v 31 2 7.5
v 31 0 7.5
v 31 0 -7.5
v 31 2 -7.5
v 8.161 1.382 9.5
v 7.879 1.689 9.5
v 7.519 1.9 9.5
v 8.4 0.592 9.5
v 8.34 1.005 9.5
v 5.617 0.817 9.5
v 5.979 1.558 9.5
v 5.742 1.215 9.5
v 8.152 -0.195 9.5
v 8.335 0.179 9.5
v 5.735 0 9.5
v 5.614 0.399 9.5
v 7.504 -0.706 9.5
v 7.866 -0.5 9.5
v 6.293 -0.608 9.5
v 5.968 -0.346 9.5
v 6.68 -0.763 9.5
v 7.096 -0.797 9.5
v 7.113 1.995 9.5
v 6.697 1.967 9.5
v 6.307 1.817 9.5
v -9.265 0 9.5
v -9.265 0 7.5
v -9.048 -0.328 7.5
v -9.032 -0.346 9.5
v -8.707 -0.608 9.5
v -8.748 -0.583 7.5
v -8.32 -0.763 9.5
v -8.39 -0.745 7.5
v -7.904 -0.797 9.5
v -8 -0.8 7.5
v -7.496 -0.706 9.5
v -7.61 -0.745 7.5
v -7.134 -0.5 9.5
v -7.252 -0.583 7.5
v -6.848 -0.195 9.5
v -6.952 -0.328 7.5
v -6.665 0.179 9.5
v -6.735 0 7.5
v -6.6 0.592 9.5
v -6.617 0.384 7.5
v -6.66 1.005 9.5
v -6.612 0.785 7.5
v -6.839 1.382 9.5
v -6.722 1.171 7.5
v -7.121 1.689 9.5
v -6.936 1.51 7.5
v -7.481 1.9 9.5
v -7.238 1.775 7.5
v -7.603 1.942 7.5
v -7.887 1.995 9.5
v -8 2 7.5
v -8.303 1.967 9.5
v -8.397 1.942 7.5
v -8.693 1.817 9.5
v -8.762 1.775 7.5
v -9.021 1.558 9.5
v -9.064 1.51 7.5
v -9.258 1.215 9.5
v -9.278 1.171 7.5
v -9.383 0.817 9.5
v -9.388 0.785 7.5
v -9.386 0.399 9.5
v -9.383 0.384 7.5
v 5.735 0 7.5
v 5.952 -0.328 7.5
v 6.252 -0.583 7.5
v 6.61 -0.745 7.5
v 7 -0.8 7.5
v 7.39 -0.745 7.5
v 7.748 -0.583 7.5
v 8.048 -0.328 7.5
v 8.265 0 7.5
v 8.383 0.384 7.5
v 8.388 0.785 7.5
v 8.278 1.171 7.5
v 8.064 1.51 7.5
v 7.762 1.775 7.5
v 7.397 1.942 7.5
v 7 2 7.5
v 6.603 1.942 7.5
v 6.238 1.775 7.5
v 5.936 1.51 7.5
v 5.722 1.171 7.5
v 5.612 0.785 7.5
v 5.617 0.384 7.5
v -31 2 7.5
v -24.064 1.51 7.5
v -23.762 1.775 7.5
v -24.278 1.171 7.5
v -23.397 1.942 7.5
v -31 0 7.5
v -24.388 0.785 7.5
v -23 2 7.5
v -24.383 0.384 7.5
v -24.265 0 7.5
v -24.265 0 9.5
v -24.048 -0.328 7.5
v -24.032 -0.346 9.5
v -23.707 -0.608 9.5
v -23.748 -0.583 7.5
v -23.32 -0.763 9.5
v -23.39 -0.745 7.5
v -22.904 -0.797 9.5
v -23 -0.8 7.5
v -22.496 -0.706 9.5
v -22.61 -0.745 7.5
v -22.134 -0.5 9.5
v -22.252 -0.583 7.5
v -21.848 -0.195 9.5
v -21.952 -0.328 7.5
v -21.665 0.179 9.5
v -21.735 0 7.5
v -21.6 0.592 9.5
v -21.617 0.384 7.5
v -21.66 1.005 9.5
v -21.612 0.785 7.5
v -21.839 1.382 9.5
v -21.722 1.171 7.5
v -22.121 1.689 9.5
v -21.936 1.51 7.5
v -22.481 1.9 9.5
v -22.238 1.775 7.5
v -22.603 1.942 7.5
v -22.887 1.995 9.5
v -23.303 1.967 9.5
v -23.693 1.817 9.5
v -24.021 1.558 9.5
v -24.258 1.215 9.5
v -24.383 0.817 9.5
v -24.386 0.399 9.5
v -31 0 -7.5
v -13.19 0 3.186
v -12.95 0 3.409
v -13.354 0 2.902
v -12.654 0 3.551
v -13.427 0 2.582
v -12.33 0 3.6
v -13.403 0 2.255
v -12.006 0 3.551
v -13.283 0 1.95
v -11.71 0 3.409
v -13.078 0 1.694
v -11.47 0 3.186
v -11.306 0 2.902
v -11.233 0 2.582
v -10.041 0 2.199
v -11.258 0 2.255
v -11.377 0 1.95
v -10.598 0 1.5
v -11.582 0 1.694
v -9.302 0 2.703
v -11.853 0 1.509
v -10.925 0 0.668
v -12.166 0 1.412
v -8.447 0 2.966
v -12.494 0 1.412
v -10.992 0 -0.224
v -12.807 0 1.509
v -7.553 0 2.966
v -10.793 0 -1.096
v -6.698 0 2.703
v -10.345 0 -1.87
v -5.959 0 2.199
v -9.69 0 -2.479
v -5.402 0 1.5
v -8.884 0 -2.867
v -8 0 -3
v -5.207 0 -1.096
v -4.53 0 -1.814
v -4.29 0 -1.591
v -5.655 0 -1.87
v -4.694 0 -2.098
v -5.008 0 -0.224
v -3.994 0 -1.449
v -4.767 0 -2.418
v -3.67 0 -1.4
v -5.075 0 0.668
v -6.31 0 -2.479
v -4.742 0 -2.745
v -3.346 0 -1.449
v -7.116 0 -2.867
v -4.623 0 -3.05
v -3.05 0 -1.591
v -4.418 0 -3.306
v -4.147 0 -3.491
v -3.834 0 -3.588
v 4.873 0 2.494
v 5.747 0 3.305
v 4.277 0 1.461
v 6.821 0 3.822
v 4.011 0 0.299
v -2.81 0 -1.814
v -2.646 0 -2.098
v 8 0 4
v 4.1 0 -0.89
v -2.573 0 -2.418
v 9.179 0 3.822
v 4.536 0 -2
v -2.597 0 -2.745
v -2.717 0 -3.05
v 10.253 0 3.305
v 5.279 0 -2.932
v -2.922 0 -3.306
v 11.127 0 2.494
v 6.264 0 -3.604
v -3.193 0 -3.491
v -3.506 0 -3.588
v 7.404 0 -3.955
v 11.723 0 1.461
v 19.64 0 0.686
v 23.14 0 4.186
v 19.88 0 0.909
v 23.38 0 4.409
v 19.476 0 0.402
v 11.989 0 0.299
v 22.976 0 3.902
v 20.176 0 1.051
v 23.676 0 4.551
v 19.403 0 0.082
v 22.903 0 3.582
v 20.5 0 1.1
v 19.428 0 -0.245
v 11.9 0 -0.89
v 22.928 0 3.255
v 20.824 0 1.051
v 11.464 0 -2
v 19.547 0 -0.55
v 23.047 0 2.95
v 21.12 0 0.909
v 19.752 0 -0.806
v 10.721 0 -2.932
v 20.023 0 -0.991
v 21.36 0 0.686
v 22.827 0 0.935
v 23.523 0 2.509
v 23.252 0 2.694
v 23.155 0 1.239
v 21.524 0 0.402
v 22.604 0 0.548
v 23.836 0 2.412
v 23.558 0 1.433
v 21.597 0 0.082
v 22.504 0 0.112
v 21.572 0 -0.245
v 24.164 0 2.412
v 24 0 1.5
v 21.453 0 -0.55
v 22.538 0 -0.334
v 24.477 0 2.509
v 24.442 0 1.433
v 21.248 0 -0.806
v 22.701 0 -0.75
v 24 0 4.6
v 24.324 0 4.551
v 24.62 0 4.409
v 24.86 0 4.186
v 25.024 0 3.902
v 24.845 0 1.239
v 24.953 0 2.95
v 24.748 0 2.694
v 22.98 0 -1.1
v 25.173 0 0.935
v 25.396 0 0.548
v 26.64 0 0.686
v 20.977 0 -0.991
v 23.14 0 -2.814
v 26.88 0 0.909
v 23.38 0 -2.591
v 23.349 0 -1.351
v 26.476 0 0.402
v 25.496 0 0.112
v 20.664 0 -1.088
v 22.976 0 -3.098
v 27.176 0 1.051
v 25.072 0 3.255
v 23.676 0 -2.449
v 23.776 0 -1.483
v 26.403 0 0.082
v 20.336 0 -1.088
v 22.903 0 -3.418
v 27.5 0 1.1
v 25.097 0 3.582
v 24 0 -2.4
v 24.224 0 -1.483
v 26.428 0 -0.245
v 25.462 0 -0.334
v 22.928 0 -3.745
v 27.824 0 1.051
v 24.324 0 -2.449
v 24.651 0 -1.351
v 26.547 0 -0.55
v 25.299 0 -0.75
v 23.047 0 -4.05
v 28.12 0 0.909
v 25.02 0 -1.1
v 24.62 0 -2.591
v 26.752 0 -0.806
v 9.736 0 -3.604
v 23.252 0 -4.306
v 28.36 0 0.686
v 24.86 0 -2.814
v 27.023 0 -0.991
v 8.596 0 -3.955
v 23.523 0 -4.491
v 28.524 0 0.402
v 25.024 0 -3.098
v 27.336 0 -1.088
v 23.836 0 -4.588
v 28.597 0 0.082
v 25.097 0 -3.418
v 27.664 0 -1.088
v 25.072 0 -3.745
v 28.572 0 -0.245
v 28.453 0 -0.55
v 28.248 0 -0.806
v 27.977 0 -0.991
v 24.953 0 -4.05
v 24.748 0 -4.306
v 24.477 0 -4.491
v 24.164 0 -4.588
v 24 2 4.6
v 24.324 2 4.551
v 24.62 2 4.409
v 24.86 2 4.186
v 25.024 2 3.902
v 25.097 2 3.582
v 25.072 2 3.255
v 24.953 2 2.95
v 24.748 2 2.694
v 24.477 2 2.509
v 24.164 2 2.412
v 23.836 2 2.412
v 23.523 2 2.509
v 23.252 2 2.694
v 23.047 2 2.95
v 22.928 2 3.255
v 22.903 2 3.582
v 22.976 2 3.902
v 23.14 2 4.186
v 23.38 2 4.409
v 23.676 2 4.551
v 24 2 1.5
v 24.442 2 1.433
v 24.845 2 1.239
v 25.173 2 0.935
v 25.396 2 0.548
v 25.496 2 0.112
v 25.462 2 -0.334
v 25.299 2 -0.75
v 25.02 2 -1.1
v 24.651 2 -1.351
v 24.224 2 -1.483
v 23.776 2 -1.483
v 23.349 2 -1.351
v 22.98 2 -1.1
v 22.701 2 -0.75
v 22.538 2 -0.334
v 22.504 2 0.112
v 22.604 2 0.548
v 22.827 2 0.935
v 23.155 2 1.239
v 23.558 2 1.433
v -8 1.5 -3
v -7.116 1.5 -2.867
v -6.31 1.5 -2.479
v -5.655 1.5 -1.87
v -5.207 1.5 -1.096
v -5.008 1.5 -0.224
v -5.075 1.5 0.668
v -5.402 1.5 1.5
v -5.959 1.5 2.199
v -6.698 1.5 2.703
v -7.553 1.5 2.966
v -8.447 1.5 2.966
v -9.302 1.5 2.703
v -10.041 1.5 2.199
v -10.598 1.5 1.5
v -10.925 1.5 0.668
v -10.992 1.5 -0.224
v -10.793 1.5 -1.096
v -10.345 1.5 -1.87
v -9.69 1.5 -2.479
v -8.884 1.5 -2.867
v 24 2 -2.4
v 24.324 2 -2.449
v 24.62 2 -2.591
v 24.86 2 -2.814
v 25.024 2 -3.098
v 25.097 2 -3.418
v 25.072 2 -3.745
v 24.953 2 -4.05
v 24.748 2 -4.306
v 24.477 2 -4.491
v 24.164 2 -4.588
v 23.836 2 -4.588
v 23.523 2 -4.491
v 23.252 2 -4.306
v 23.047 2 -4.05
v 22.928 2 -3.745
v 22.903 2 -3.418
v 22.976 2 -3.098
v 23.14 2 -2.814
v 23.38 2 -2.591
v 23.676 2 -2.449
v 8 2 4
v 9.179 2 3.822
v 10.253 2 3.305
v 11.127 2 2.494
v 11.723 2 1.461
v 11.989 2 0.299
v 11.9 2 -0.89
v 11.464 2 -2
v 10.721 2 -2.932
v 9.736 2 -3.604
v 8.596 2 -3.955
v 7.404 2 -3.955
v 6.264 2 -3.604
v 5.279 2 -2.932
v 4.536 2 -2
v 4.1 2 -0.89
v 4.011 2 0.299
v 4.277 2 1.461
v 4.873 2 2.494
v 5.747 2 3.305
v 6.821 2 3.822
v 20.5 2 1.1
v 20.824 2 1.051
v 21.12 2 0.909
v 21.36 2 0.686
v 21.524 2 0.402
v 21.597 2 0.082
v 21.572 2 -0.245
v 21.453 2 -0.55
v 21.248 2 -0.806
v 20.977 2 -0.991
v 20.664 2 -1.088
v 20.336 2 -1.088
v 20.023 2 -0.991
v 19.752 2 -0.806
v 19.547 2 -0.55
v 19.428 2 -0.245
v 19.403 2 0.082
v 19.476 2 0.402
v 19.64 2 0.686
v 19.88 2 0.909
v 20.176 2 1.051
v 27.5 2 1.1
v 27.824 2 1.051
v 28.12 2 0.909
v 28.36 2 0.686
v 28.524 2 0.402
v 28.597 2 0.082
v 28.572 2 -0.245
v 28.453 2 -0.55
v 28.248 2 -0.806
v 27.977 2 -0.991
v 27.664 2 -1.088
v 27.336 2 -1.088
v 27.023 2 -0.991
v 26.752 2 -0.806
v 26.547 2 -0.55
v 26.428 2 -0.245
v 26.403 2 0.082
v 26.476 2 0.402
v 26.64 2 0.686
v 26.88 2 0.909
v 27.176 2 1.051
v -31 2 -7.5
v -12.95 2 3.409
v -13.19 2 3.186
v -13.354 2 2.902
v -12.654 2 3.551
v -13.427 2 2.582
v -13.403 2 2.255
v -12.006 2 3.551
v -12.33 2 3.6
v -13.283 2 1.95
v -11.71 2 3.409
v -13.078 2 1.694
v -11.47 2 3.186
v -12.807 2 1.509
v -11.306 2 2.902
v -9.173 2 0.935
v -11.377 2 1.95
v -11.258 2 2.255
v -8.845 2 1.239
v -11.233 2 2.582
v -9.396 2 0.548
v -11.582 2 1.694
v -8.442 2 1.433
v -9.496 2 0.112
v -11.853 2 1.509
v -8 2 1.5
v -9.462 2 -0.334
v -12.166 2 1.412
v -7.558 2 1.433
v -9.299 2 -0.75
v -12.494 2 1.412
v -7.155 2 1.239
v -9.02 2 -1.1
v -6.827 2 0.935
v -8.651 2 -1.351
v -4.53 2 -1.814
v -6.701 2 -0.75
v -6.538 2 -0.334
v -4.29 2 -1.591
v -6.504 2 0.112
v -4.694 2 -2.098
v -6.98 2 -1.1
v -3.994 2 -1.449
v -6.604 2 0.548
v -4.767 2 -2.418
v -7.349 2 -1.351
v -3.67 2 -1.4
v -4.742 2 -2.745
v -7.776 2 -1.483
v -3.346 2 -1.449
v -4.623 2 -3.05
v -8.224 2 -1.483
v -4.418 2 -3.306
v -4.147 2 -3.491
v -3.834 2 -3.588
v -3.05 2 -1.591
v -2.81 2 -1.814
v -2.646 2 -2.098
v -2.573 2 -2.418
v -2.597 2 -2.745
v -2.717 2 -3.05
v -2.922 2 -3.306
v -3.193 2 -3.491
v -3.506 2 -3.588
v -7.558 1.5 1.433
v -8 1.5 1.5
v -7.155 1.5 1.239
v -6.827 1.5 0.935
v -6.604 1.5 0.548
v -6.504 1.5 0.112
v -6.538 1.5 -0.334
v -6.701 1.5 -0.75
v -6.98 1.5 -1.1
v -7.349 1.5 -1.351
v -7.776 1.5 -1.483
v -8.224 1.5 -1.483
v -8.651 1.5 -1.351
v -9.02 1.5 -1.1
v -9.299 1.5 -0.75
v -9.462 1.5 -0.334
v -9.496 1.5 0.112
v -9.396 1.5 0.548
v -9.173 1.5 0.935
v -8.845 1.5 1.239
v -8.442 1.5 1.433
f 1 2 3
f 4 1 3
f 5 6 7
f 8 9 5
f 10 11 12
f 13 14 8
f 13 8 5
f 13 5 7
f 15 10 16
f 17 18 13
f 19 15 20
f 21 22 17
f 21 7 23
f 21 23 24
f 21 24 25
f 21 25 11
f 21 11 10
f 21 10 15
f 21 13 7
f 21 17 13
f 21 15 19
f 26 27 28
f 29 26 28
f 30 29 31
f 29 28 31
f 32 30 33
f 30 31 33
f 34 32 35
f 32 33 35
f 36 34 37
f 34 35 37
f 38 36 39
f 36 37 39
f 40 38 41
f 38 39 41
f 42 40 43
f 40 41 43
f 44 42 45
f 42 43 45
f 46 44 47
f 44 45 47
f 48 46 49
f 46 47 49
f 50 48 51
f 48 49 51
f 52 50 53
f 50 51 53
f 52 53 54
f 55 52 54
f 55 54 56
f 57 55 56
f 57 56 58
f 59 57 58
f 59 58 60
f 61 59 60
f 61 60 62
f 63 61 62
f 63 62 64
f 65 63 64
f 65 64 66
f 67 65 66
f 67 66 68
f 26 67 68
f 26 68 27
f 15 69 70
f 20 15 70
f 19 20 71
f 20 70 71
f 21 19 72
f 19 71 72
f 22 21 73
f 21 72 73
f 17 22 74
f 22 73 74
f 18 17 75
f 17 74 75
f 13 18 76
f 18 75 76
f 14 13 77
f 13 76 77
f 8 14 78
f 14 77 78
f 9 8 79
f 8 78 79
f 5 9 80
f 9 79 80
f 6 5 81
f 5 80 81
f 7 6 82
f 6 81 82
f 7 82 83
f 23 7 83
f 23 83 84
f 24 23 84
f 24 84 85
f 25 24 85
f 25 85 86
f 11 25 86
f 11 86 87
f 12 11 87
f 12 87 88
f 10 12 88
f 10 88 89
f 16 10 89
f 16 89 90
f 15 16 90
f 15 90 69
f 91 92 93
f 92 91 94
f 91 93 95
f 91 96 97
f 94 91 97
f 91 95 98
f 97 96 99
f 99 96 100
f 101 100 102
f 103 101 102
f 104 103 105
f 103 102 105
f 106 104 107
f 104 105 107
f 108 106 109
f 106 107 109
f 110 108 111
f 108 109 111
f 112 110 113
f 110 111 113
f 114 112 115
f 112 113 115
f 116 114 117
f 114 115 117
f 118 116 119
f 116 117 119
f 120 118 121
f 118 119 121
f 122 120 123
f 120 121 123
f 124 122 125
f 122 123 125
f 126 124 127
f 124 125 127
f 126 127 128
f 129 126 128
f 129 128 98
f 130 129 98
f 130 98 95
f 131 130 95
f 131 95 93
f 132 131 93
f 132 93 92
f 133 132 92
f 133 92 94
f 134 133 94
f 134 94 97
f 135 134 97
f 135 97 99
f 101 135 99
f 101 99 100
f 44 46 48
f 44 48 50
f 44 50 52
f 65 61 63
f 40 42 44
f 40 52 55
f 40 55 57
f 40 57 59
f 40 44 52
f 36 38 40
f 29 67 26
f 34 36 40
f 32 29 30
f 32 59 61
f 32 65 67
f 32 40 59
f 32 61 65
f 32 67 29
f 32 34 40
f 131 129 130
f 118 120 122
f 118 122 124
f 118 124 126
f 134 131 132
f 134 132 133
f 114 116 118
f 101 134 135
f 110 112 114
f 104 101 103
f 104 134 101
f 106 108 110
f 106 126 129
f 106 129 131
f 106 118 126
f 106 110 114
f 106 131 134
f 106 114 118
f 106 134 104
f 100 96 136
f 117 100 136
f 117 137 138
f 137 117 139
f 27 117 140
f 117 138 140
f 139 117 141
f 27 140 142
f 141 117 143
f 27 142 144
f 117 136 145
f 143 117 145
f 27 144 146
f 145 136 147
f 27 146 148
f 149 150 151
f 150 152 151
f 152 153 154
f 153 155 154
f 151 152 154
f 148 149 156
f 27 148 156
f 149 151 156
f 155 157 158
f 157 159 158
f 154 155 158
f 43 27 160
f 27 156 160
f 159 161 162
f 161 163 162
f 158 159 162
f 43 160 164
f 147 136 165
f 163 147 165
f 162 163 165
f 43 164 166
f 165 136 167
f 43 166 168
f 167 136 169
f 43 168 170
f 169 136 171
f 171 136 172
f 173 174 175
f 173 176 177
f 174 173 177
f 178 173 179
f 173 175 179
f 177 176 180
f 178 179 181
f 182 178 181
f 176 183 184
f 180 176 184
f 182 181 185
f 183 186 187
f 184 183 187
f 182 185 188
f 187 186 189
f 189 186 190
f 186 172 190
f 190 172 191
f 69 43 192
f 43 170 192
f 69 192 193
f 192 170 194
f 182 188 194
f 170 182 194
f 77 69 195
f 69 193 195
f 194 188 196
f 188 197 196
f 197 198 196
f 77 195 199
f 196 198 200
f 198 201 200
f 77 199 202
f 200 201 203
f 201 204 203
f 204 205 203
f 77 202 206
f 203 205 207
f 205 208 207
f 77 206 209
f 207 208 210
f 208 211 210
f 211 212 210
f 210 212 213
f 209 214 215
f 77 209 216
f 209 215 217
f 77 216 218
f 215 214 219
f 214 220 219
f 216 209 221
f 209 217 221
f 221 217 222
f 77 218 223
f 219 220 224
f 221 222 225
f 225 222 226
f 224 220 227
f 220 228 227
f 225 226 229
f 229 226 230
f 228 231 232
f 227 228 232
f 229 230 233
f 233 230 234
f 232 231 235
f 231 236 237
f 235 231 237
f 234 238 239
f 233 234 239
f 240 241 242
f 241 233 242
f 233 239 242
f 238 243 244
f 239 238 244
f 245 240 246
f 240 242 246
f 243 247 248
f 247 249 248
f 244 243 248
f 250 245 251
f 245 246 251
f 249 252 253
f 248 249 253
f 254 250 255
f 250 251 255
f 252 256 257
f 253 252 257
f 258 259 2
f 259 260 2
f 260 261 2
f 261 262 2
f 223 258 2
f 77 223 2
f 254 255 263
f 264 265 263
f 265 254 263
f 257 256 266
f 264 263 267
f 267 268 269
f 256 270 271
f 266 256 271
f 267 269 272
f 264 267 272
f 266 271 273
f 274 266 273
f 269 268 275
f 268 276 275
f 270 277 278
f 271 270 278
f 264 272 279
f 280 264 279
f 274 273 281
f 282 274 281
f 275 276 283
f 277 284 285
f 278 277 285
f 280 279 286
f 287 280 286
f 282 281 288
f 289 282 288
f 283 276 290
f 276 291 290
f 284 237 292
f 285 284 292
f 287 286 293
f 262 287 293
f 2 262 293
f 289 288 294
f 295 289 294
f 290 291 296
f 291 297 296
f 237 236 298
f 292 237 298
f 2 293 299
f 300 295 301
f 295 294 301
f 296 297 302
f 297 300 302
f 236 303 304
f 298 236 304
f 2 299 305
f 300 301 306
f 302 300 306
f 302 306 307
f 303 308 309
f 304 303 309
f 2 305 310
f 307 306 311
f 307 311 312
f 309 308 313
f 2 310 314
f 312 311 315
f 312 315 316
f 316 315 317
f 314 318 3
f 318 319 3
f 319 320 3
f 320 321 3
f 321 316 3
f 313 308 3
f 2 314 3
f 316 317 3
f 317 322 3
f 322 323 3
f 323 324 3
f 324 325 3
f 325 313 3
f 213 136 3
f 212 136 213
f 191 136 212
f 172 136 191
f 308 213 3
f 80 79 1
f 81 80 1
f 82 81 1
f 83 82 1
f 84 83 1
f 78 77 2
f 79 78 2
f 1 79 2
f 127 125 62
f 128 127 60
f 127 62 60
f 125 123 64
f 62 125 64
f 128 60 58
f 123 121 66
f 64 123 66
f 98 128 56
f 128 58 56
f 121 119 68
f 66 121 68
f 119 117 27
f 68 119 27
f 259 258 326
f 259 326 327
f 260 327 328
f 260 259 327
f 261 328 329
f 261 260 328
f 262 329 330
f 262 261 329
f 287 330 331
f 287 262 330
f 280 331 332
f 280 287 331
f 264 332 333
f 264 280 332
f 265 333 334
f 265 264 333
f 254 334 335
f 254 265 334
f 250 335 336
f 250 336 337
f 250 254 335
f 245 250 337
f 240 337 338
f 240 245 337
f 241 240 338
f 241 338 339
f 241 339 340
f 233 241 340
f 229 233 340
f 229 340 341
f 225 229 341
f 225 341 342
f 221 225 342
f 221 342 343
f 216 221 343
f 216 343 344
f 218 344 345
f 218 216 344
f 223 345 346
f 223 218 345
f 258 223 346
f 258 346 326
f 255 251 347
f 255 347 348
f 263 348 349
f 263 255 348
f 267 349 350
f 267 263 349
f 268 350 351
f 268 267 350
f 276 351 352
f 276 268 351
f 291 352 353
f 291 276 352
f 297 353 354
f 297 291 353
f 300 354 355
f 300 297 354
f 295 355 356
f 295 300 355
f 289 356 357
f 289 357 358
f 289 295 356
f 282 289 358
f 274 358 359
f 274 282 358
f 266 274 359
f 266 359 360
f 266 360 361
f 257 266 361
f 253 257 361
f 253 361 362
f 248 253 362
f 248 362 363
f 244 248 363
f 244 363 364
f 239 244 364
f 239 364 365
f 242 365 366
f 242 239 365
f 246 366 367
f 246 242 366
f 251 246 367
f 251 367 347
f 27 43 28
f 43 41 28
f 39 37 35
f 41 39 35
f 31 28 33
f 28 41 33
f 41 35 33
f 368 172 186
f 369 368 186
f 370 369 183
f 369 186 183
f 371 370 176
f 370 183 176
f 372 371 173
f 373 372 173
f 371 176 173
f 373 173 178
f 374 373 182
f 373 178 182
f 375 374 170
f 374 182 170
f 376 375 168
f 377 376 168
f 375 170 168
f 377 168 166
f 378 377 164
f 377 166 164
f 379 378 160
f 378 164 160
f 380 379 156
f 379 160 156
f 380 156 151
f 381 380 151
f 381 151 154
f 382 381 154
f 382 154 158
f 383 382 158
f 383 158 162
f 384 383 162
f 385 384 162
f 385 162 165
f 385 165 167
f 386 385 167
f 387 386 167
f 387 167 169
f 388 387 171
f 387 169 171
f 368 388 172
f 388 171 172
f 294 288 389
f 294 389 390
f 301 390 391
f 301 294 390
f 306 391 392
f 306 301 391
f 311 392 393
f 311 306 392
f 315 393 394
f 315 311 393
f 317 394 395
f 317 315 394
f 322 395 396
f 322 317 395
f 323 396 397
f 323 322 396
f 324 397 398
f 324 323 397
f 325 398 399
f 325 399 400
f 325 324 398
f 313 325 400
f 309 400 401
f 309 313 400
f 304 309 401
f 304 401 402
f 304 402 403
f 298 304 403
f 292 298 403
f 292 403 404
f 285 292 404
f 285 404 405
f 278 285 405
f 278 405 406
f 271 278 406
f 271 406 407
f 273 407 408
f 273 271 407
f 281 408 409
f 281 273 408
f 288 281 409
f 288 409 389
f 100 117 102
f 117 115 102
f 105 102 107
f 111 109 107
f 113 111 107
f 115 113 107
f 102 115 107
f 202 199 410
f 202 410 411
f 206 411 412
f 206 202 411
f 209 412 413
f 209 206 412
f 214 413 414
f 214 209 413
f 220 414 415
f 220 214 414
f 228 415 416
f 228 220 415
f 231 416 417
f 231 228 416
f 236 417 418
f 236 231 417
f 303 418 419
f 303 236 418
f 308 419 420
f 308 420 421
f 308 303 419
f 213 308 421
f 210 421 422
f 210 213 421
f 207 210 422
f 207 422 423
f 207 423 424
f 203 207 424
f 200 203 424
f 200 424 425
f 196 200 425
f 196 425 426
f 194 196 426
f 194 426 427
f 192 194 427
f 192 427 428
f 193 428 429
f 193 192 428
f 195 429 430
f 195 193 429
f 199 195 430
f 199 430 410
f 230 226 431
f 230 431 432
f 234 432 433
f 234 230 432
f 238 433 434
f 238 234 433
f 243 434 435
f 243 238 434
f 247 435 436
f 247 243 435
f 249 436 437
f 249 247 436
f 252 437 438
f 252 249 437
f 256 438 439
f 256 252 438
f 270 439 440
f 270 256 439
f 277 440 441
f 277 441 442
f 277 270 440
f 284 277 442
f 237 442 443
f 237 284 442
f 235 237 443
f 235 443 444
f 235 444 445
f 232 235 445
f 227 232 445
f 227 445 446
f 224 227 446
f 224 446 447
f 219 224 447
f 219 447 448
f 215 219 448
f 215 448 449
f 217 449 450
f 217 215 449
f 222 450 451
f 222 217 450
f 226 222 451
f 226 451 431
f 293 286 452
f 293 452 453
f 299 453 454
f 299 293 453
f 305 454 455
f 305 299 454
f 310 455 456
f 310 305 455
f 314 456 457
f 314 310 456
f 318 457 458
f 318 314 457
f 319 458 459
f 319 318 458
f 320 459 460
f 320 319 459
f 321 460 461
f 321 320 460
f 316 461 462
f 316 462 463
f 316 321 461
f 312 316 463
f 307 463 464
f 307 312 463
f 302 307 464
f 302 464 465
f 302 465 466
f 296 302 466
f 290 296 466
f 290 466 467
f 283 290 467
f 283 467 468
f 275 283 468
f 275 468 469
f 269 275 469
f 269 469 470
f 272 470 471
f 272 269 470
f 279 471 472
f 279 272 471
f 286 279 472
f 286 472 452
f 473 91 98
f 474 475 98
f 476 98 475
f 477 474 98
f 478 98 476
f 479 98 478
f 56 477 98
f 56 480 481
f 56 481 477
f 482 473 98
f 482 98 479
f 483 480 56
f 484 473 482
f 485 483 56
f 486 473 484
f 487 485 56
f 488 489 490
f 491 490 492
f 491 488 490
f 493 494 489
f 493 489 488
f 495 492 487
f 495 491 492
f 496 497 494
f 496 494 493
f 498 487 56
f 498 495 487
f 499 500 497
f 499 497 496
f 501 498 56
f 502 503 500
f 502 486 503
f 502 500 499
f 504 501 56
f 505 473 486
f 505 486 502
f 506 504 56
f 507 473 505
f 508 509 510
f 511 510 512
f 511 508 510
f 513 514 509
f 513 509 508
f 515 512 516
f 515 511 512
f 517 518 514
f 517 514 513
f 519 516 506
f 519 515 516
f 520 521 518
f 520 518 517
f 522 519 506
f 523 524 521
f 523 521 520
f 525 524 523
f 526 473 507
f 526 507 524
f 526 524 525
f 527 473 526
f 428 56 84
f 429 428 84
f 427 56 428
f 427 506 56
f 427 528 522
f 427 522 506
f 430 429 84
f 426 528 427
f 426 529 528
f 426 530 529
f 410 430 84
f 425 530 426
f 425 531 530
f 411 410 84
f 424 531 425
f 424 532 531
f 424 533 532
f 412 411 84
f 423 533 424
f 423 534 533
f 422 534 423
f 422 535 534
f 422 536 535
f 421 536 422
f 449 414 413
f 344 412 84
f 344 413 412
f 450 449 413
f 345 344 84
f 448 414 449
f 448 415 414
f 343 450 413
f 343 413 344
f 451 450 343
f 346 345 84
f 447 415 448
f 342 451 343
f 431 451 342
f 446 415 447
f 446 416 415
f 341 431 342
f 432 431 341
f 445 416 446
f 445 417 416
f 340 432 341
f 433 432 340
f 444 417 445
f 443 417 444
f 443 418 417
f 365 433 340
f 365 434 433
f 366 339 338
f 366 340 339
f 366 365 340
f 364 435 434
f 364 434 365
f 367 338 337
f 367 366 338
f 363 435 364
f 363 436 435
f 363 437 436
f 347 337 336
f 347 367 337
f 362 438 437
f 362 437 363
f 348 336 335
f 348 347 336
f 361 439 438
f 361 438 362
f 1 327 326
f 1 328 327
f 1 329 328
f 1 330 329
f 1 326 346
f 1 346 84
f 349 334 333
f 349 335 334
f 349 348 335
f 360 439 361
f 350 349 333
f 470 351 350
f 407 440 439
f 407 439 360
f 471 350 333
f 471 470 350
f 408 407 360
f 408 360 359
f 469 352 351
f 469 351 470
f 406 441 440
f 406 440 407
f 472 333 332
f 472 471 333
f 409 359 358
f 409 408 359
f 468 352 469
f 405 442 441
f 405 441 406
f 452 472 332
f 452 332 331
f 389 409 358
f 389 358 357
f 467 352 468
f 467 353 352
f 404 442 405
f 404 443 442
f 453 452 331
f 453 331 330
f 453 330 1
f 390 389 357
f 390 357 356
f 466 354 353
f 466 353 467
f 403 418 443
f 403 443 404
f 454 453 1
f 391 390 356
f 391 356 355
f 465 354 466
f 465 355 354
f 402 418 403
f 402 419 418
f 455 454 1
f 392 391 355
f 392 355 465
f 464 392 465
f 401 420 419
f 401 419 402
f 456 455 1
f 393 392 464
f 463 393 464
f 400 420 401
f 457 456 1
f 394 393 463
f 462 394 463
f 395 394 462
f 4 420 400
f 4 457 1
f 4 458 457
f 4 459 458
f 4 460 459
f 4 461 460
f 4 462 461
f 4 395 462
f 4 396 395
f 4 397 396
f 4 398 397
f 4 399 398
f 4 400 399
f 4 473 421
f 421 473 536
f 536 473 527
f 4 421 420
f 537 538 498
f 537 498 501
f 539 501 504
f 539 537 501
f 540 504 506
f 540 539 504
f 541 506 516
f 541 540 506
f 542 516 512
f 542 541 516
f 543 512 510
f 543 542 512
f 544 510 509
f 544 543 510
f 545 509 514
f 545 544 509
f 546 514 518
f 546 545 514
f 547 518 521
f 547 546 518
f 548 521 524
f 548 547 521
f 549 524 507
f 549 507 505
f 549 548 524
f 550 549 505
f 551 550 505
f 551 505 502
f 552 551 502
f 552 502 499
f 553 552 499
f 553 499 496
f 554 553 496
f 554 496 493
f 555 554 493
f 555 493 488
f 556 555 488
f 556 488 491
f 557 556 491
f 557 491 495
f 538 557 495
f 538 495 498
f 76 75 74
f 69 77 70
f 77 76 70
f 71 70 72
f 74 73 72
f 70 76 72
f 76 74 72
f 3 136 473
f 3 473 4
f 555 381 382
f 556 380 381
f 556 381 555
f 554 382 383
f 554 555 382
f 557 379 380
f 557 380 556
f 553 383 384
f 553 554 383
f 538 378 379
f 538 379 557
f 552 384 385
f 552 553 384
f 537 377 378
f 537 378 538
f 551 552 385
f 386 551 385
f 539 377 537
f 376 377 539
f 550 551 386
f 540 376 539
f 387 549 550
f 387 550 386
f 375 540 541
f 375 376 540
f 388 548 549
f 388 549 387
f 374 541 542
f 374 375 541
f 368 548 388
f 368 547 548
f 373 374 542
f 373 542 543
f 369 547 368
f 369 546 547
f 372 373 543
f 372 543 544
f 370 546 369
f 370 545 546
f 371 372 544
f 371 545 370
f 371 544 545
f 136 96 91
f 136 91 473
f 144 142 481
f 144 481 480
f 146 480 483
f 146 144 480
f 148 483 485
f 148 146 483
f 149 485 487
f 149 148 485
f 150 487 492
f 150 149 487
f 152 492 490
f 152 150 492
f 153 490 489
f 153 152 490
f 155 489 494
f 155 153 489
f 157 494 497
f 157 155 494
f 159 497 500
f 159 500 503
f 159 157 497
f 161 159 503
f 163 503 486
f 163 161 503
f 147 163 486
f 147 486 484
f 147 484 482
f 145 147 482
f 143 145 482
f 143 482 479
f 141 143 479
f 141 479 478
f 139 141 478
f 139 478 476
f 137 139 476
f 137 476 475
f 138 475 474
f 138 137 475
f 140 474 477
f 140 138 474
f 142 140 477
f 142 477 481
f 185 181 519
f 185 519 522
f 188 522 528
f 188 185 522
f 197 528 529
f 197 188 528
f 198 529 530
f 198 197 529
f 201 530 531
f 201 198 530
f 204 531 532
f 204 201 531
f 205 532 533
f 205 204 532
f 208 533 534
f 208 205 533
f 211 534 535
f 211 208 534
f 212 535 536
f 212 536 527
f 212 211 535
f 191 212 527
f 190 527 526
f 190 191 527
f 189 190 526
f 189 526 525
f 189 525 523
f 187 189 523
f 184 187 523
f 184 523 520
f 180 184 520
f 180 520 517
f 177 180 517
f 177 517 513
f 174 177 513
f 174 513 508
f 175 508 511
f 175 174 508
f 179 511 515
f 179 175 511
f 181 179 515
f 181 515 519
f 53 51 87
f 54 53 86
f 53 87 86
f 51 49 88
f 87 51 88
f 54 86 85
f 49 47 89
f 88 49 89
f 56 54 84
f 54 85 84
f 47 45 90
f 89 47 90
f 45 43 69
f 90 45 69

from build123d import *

# Parameters (mm, degrees)
SKETCH_1_W          = 62
SKETCH_1_H          = 15
SKETCH_1_R          = 1.5
SKETCH_1_R_2        = 1.1
SKETCH_1_R_3        = 4
EXTRUDE_1_DEPTH     = 2
SKETCH_2_R          = 1.4
EXTRUDE_2_DEPTH     = 2
SKETCH_3_R          = 3
CUT_EXTRUDE_1_DEPTH = 1.5


with BuildPart() as part:
    # 草图1 → 凸台-拉伸1 (new body)
    with BuildSketch(Plane(origin=(0, 0, 0), x_dir=(1, 0, 0), z_dir=(0, 1, 0))):
        Rectangle(SKETCH_1_W, SKETCH_1_H)
        with Locations(Location((-8, 0, 0), (0, 0, 270))):
            Circle(SKETCH_1_R, mode=Mode.SUBTRACT)
        with Locations(Location((-3.669872981, 2.5, 0), (0, 0, 270))):
            Circle(SKETCH_1_R_2, mode=Mode.SUBTRACT)
        with Locations(Location((-12.330127019, -2.5, 0), (0, 0, 270))):
            Circle(SKETCH_1_R_2, mode=Mode.SUBTRACT)
        with Locations(Location((8, 0, 0), (0, 0, 270))):
            Circle(SKETCH_1_R_3, mode=Mode.SUBTRACT)
        with Locations(Location((24, 0, 0), (0, 0, 270))):
            Circle(SKETCH_1_R, mode=Mode.SUBTRACT)
        with Locations(Location((27.5, 0, 0), (0, 0, 270))):
            Circle(SKETCH_1_R_2, mode=Mode.SUBTRACT)
        with Locations(Location((24, -3.5, 0), (0, 0, 270))):
            Circle(SKETCH_1_R_2, mode=Mode.SUBTRACT)
        with Locations(Location((20.5, 0, 0), (0, 0, 270))):
            Circle(SKETCH_1_R_2, mode=Mode.SUBTRACT)
        with Locations(Location((24, 3.5, 0), (0, 0, 270))):
            Circle(SKETCH_1_R_2, mode=Mode.SUBTRACT)
    extrude(amount=EXTRUDE_1_DEPTH)

    # 草图2 → 凸台-拉伸2 (add)
    with BuildSketch(Plane.XY.offset(7.5)):
        with Locations(Location((-23, 0.6, 0), (0, 0, 205.376933525))):
            Circle(SKETCH_2_R)
        with Locations(Location((-8, 0.6, 0), (0, 0, 205.376933525))):
            Circle(SKETCH_2_R)
        with Locations(Location((7, 0.6, 0), (0, 0, 205.376933525))):
            Circle(SKETCH_2_R)
    extrude(amount=EXTRUDE_2_DEPTH)

    # 草图3 → 切除-拉伸1 (cut)
    with BuildSketch(Plane.XZ):
        with Locations(Location((-8, 0, 0), (0, 0, 270))):
            Circle(SKETCH_3_R)
    extrude(amount=-CUT_EXTRUDE_1_DEPTH, mode=Mode.SUBTRACT)


solid = part.part
